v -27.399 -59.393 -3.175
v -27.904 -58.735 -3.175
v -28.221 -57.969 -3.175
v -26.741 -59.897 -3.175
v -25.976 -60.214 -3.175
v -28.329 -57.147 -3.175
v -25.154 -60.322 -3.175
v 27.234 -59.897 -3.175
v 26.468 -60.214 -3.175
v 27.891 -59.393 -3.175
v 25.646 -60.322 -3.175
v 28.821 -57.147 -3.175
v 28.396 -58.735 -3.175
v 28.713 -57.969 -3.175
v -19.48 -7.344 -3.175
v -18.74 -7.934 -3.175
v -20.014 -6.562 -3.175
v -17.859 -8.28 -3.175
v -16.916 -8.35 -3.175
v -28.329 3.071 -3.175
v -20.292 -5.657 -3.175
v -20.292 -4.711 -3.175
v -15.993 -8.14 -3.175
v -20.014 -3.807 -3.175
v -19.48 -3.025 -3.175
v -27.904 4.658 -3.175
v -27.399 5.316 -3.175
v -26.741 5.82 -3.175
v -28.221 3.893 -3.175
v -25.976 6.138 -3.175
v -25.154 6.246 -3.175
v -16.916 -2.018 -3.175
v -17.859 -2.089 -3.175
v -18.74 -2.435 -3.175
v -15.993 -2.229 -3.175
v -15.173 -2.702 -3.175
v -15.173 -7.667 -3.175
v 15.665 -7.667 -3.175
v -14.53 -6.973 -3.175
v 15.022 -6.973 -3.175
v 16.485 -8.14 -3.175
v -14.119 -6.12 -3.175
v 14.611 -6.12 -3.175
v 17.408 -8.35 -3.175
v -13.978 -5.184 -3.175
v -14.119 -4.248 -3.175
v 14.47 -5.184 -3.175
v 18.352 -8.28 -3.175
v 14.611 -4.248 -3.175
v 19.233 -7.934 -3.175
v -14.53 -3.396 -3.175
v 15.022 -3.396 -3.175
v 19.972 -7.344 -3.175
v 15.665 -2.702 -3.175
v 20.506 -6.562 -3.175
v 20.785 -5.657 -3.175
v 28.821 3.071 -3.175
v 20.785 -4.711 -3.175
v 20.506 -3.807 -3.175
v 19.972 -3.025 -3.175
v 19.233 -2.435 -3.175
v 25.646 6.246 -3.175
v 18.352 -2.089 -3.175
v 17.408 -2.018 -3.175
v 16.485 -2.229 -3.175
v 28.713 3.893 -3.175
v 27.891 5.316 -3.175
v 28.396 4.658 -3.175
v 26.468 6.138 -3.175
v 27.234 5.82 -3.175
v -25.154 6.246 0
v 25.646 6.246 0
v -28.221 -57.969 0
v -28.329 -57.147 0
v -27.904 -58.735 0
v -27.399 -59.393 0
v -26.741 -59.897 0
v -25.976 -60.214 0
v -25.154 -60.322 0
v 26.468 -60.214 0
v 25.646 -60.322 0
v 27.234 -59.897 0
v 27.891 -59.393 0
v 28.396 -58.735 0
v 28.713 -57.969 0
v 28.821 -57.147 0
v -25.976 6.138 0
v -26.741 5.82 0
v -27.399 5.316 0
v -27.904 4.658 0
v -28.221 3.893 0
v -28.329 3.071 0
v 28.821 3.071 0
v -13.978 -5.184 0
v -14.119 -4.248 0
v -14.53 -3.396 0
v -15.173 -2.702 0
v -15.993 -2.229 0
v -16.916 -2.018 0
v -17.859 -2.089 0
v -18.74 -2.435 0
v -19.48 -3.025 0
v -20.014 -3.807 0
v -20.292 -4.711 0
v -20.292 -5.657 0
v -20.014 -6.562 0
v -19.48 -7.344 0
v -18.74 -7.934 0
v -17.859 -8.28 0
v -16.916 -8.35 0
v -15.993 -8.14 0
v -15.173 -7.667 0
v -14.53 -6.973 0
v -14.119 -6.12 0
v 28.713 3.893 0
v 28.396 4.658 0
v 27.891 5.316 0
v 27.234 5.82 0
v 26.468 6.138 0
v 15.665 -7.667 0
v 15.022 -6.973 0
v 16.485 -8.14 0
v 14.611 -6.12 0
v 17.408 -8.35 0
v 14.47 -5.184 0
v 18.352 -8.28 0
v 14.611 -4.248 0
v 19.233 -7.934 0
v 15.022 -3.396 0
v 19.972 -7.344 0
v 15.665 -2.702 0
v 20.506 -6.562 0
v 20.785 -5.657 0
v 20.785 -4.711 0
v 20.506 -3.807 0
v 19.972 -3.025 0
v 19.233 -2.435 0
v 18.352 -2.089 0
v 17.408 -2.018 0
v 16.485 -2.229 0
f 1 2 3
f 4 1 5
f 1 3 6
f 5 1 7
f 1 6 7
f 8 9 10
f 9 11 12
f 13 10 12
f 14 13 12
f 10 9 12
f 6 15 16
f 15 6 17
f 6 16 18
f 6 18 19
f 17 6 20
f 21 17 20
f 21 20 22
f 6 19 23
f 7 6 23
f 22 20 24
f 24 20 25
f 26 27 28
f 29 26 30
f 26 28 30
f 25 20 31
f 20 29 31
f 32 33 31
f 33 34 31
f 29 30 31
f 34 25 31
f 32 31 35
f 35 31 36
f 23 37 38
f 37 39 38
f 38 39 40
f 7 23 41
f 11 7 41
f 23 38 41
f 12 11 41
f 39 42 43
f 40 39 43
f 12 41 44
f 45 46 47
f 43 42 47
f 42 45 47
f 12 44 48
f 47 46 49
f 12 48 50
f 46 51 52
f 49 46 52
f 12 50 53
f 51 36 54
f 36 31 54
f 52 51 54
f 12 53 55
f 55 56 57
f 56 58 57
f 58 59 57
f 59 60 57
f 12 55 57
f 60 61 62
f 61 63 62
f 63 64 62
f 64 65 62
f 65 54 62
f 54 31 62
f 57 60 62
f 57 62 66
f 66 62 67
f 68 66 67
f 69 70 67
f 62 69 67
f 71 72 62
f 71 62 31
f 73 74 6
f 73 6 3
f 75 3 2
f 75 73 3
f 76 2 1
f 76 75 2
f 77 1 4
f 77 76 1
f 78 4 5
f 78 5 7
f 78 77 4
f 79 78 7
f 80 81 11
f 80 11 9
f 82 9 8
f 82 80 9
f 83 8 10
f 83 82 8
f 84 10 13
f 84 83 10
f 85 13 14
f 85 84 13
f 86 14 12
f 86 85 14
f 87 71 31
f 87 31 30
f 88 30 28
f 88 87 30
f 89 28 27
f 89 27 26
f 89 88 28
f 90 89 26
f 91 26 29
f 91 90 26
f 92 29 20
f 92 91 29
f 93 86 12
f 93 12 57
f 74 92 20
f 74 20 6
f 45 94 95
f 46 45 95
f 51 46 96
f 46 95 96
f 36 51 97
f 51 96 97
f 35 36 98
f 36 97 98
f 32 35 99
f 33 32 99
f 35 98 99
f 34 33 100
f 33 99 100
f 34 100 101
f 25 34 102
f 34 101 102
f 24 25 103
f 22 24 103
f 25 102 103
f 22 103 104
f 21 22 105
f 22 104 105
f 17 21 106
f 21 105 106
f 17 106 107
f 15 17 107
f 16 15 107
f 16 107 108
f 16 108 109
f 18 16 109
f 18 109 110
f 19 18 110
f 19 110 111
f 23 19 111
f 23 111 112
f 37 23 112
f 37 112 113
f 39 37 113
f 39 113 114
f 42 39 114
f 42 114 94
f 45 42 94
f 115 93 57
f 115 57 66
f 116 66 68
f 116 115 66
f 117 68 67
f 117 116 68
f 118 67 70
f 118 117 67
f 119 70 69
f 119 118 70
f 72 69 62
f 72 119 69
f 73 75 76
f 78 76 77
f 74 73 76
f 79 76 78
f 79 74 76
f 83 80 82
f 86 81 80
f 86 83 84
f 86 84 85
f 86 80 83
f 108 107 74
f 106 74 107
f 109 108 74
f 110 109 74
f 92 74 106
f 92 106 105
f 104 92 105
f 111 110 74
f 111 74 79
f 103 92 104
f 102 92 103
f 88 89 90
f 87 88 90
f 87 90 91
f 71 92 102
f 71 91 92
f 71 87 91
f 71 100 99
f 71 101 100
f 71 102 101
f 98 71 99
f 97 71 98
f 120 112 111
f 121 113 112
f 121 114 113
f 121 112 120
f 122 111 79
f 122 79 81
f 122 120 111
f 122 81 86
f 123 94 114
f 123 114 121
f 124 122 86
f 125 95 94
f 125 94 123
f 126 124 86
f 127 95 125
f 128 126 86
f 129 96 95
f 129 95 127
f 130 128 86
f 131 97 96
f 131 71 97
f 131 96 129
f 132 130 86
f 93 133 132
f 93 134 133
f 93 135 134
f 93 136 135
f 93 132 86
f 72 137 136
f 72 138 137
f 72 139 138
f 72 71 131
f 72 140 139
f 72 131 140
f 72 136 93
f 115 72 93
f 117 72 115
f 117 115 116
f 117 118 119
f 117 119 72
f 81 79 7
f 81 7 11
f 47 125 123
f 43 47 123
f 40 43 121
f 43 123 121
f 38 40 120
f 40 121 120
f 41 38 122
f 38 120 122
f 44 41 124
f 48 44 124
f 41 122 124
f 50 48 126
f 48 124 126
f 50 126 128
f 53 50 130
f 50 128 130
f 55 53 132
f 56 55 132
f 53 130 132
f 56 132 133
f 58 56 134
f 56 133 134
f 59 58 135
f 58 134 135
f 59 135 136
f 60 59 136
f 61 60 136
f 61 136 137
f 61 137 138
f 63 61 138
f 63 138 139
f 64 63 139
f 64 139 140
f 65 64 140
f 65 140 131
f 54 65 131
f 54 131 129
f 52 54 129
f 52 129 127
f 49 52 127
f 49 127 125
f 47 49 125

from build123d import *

# Parameters (mm, degrees)
BOSS_EXTRUDE1_DEPTH = 3.175
SKETCH2_R           = 3.175
CUT_EXTRUDE1_DEPTH  = 67.929307933


with BuildPart() as part:
    # Sketch1 → Boss-Extrude1 (new body)
    with BuildSketch(Plane.XY):
        with BuildLine():
            Line((-28.328951223, 3.070773738), (-28.328951223, -34.922456704))
            Line((-28.328951223, -34.922456704), (-28.328951223, -57.147456704))
            ThreePointArc((-28.328951223, -57.147456704), (-27.399015253, -59.392520734), (-25.153951223, -60.322456704))
            Line((-25.153951223, -60.322456704), (25.646048777, -60.322456704))
            ThreePointArc((25.646048777, -60.322456704), (27.891112807, -59.392520734), (28.821048777, -57.147456704))
            Line((28.821048777, -57.147456704), (28.821048777, -34.922456704))
            Line((28.821048777, -34.922456704), (28.821048777, 3.070773738))
            ThreePointArc((28.821048777, 3.070773738), (27.891112807, 5.315837768), (25.646048777, 6.245773738))
            Line((25.646048777, 6.245773738), (-25.153951223, 6.245773738))
            ThreePointArc((-25.153951223, 6.245773738), (-27.399015253, 5.315837768), (-28.328951223, 3.070773738))
        make_face()
    extrude(amount=-BOSS_EXTRUDE1_DEPTH)

    # Sketch2 → Cut-Extrude1 (cut, through all)
    with BuildSketch(Plane.XY):
        with Locations((-17.152951223, -5.184226262)):
            Circle(SKETCH2_R)
        with Locations(Location((17.645048777, -5.184226262, 0), (0, 0, 180))):
            Circle(SKETCH2_R)
    extrude(amount=-CUT_EXTRUDE1_DEPTH, mode=Mode.SUBTRACT)


solid = part.part
